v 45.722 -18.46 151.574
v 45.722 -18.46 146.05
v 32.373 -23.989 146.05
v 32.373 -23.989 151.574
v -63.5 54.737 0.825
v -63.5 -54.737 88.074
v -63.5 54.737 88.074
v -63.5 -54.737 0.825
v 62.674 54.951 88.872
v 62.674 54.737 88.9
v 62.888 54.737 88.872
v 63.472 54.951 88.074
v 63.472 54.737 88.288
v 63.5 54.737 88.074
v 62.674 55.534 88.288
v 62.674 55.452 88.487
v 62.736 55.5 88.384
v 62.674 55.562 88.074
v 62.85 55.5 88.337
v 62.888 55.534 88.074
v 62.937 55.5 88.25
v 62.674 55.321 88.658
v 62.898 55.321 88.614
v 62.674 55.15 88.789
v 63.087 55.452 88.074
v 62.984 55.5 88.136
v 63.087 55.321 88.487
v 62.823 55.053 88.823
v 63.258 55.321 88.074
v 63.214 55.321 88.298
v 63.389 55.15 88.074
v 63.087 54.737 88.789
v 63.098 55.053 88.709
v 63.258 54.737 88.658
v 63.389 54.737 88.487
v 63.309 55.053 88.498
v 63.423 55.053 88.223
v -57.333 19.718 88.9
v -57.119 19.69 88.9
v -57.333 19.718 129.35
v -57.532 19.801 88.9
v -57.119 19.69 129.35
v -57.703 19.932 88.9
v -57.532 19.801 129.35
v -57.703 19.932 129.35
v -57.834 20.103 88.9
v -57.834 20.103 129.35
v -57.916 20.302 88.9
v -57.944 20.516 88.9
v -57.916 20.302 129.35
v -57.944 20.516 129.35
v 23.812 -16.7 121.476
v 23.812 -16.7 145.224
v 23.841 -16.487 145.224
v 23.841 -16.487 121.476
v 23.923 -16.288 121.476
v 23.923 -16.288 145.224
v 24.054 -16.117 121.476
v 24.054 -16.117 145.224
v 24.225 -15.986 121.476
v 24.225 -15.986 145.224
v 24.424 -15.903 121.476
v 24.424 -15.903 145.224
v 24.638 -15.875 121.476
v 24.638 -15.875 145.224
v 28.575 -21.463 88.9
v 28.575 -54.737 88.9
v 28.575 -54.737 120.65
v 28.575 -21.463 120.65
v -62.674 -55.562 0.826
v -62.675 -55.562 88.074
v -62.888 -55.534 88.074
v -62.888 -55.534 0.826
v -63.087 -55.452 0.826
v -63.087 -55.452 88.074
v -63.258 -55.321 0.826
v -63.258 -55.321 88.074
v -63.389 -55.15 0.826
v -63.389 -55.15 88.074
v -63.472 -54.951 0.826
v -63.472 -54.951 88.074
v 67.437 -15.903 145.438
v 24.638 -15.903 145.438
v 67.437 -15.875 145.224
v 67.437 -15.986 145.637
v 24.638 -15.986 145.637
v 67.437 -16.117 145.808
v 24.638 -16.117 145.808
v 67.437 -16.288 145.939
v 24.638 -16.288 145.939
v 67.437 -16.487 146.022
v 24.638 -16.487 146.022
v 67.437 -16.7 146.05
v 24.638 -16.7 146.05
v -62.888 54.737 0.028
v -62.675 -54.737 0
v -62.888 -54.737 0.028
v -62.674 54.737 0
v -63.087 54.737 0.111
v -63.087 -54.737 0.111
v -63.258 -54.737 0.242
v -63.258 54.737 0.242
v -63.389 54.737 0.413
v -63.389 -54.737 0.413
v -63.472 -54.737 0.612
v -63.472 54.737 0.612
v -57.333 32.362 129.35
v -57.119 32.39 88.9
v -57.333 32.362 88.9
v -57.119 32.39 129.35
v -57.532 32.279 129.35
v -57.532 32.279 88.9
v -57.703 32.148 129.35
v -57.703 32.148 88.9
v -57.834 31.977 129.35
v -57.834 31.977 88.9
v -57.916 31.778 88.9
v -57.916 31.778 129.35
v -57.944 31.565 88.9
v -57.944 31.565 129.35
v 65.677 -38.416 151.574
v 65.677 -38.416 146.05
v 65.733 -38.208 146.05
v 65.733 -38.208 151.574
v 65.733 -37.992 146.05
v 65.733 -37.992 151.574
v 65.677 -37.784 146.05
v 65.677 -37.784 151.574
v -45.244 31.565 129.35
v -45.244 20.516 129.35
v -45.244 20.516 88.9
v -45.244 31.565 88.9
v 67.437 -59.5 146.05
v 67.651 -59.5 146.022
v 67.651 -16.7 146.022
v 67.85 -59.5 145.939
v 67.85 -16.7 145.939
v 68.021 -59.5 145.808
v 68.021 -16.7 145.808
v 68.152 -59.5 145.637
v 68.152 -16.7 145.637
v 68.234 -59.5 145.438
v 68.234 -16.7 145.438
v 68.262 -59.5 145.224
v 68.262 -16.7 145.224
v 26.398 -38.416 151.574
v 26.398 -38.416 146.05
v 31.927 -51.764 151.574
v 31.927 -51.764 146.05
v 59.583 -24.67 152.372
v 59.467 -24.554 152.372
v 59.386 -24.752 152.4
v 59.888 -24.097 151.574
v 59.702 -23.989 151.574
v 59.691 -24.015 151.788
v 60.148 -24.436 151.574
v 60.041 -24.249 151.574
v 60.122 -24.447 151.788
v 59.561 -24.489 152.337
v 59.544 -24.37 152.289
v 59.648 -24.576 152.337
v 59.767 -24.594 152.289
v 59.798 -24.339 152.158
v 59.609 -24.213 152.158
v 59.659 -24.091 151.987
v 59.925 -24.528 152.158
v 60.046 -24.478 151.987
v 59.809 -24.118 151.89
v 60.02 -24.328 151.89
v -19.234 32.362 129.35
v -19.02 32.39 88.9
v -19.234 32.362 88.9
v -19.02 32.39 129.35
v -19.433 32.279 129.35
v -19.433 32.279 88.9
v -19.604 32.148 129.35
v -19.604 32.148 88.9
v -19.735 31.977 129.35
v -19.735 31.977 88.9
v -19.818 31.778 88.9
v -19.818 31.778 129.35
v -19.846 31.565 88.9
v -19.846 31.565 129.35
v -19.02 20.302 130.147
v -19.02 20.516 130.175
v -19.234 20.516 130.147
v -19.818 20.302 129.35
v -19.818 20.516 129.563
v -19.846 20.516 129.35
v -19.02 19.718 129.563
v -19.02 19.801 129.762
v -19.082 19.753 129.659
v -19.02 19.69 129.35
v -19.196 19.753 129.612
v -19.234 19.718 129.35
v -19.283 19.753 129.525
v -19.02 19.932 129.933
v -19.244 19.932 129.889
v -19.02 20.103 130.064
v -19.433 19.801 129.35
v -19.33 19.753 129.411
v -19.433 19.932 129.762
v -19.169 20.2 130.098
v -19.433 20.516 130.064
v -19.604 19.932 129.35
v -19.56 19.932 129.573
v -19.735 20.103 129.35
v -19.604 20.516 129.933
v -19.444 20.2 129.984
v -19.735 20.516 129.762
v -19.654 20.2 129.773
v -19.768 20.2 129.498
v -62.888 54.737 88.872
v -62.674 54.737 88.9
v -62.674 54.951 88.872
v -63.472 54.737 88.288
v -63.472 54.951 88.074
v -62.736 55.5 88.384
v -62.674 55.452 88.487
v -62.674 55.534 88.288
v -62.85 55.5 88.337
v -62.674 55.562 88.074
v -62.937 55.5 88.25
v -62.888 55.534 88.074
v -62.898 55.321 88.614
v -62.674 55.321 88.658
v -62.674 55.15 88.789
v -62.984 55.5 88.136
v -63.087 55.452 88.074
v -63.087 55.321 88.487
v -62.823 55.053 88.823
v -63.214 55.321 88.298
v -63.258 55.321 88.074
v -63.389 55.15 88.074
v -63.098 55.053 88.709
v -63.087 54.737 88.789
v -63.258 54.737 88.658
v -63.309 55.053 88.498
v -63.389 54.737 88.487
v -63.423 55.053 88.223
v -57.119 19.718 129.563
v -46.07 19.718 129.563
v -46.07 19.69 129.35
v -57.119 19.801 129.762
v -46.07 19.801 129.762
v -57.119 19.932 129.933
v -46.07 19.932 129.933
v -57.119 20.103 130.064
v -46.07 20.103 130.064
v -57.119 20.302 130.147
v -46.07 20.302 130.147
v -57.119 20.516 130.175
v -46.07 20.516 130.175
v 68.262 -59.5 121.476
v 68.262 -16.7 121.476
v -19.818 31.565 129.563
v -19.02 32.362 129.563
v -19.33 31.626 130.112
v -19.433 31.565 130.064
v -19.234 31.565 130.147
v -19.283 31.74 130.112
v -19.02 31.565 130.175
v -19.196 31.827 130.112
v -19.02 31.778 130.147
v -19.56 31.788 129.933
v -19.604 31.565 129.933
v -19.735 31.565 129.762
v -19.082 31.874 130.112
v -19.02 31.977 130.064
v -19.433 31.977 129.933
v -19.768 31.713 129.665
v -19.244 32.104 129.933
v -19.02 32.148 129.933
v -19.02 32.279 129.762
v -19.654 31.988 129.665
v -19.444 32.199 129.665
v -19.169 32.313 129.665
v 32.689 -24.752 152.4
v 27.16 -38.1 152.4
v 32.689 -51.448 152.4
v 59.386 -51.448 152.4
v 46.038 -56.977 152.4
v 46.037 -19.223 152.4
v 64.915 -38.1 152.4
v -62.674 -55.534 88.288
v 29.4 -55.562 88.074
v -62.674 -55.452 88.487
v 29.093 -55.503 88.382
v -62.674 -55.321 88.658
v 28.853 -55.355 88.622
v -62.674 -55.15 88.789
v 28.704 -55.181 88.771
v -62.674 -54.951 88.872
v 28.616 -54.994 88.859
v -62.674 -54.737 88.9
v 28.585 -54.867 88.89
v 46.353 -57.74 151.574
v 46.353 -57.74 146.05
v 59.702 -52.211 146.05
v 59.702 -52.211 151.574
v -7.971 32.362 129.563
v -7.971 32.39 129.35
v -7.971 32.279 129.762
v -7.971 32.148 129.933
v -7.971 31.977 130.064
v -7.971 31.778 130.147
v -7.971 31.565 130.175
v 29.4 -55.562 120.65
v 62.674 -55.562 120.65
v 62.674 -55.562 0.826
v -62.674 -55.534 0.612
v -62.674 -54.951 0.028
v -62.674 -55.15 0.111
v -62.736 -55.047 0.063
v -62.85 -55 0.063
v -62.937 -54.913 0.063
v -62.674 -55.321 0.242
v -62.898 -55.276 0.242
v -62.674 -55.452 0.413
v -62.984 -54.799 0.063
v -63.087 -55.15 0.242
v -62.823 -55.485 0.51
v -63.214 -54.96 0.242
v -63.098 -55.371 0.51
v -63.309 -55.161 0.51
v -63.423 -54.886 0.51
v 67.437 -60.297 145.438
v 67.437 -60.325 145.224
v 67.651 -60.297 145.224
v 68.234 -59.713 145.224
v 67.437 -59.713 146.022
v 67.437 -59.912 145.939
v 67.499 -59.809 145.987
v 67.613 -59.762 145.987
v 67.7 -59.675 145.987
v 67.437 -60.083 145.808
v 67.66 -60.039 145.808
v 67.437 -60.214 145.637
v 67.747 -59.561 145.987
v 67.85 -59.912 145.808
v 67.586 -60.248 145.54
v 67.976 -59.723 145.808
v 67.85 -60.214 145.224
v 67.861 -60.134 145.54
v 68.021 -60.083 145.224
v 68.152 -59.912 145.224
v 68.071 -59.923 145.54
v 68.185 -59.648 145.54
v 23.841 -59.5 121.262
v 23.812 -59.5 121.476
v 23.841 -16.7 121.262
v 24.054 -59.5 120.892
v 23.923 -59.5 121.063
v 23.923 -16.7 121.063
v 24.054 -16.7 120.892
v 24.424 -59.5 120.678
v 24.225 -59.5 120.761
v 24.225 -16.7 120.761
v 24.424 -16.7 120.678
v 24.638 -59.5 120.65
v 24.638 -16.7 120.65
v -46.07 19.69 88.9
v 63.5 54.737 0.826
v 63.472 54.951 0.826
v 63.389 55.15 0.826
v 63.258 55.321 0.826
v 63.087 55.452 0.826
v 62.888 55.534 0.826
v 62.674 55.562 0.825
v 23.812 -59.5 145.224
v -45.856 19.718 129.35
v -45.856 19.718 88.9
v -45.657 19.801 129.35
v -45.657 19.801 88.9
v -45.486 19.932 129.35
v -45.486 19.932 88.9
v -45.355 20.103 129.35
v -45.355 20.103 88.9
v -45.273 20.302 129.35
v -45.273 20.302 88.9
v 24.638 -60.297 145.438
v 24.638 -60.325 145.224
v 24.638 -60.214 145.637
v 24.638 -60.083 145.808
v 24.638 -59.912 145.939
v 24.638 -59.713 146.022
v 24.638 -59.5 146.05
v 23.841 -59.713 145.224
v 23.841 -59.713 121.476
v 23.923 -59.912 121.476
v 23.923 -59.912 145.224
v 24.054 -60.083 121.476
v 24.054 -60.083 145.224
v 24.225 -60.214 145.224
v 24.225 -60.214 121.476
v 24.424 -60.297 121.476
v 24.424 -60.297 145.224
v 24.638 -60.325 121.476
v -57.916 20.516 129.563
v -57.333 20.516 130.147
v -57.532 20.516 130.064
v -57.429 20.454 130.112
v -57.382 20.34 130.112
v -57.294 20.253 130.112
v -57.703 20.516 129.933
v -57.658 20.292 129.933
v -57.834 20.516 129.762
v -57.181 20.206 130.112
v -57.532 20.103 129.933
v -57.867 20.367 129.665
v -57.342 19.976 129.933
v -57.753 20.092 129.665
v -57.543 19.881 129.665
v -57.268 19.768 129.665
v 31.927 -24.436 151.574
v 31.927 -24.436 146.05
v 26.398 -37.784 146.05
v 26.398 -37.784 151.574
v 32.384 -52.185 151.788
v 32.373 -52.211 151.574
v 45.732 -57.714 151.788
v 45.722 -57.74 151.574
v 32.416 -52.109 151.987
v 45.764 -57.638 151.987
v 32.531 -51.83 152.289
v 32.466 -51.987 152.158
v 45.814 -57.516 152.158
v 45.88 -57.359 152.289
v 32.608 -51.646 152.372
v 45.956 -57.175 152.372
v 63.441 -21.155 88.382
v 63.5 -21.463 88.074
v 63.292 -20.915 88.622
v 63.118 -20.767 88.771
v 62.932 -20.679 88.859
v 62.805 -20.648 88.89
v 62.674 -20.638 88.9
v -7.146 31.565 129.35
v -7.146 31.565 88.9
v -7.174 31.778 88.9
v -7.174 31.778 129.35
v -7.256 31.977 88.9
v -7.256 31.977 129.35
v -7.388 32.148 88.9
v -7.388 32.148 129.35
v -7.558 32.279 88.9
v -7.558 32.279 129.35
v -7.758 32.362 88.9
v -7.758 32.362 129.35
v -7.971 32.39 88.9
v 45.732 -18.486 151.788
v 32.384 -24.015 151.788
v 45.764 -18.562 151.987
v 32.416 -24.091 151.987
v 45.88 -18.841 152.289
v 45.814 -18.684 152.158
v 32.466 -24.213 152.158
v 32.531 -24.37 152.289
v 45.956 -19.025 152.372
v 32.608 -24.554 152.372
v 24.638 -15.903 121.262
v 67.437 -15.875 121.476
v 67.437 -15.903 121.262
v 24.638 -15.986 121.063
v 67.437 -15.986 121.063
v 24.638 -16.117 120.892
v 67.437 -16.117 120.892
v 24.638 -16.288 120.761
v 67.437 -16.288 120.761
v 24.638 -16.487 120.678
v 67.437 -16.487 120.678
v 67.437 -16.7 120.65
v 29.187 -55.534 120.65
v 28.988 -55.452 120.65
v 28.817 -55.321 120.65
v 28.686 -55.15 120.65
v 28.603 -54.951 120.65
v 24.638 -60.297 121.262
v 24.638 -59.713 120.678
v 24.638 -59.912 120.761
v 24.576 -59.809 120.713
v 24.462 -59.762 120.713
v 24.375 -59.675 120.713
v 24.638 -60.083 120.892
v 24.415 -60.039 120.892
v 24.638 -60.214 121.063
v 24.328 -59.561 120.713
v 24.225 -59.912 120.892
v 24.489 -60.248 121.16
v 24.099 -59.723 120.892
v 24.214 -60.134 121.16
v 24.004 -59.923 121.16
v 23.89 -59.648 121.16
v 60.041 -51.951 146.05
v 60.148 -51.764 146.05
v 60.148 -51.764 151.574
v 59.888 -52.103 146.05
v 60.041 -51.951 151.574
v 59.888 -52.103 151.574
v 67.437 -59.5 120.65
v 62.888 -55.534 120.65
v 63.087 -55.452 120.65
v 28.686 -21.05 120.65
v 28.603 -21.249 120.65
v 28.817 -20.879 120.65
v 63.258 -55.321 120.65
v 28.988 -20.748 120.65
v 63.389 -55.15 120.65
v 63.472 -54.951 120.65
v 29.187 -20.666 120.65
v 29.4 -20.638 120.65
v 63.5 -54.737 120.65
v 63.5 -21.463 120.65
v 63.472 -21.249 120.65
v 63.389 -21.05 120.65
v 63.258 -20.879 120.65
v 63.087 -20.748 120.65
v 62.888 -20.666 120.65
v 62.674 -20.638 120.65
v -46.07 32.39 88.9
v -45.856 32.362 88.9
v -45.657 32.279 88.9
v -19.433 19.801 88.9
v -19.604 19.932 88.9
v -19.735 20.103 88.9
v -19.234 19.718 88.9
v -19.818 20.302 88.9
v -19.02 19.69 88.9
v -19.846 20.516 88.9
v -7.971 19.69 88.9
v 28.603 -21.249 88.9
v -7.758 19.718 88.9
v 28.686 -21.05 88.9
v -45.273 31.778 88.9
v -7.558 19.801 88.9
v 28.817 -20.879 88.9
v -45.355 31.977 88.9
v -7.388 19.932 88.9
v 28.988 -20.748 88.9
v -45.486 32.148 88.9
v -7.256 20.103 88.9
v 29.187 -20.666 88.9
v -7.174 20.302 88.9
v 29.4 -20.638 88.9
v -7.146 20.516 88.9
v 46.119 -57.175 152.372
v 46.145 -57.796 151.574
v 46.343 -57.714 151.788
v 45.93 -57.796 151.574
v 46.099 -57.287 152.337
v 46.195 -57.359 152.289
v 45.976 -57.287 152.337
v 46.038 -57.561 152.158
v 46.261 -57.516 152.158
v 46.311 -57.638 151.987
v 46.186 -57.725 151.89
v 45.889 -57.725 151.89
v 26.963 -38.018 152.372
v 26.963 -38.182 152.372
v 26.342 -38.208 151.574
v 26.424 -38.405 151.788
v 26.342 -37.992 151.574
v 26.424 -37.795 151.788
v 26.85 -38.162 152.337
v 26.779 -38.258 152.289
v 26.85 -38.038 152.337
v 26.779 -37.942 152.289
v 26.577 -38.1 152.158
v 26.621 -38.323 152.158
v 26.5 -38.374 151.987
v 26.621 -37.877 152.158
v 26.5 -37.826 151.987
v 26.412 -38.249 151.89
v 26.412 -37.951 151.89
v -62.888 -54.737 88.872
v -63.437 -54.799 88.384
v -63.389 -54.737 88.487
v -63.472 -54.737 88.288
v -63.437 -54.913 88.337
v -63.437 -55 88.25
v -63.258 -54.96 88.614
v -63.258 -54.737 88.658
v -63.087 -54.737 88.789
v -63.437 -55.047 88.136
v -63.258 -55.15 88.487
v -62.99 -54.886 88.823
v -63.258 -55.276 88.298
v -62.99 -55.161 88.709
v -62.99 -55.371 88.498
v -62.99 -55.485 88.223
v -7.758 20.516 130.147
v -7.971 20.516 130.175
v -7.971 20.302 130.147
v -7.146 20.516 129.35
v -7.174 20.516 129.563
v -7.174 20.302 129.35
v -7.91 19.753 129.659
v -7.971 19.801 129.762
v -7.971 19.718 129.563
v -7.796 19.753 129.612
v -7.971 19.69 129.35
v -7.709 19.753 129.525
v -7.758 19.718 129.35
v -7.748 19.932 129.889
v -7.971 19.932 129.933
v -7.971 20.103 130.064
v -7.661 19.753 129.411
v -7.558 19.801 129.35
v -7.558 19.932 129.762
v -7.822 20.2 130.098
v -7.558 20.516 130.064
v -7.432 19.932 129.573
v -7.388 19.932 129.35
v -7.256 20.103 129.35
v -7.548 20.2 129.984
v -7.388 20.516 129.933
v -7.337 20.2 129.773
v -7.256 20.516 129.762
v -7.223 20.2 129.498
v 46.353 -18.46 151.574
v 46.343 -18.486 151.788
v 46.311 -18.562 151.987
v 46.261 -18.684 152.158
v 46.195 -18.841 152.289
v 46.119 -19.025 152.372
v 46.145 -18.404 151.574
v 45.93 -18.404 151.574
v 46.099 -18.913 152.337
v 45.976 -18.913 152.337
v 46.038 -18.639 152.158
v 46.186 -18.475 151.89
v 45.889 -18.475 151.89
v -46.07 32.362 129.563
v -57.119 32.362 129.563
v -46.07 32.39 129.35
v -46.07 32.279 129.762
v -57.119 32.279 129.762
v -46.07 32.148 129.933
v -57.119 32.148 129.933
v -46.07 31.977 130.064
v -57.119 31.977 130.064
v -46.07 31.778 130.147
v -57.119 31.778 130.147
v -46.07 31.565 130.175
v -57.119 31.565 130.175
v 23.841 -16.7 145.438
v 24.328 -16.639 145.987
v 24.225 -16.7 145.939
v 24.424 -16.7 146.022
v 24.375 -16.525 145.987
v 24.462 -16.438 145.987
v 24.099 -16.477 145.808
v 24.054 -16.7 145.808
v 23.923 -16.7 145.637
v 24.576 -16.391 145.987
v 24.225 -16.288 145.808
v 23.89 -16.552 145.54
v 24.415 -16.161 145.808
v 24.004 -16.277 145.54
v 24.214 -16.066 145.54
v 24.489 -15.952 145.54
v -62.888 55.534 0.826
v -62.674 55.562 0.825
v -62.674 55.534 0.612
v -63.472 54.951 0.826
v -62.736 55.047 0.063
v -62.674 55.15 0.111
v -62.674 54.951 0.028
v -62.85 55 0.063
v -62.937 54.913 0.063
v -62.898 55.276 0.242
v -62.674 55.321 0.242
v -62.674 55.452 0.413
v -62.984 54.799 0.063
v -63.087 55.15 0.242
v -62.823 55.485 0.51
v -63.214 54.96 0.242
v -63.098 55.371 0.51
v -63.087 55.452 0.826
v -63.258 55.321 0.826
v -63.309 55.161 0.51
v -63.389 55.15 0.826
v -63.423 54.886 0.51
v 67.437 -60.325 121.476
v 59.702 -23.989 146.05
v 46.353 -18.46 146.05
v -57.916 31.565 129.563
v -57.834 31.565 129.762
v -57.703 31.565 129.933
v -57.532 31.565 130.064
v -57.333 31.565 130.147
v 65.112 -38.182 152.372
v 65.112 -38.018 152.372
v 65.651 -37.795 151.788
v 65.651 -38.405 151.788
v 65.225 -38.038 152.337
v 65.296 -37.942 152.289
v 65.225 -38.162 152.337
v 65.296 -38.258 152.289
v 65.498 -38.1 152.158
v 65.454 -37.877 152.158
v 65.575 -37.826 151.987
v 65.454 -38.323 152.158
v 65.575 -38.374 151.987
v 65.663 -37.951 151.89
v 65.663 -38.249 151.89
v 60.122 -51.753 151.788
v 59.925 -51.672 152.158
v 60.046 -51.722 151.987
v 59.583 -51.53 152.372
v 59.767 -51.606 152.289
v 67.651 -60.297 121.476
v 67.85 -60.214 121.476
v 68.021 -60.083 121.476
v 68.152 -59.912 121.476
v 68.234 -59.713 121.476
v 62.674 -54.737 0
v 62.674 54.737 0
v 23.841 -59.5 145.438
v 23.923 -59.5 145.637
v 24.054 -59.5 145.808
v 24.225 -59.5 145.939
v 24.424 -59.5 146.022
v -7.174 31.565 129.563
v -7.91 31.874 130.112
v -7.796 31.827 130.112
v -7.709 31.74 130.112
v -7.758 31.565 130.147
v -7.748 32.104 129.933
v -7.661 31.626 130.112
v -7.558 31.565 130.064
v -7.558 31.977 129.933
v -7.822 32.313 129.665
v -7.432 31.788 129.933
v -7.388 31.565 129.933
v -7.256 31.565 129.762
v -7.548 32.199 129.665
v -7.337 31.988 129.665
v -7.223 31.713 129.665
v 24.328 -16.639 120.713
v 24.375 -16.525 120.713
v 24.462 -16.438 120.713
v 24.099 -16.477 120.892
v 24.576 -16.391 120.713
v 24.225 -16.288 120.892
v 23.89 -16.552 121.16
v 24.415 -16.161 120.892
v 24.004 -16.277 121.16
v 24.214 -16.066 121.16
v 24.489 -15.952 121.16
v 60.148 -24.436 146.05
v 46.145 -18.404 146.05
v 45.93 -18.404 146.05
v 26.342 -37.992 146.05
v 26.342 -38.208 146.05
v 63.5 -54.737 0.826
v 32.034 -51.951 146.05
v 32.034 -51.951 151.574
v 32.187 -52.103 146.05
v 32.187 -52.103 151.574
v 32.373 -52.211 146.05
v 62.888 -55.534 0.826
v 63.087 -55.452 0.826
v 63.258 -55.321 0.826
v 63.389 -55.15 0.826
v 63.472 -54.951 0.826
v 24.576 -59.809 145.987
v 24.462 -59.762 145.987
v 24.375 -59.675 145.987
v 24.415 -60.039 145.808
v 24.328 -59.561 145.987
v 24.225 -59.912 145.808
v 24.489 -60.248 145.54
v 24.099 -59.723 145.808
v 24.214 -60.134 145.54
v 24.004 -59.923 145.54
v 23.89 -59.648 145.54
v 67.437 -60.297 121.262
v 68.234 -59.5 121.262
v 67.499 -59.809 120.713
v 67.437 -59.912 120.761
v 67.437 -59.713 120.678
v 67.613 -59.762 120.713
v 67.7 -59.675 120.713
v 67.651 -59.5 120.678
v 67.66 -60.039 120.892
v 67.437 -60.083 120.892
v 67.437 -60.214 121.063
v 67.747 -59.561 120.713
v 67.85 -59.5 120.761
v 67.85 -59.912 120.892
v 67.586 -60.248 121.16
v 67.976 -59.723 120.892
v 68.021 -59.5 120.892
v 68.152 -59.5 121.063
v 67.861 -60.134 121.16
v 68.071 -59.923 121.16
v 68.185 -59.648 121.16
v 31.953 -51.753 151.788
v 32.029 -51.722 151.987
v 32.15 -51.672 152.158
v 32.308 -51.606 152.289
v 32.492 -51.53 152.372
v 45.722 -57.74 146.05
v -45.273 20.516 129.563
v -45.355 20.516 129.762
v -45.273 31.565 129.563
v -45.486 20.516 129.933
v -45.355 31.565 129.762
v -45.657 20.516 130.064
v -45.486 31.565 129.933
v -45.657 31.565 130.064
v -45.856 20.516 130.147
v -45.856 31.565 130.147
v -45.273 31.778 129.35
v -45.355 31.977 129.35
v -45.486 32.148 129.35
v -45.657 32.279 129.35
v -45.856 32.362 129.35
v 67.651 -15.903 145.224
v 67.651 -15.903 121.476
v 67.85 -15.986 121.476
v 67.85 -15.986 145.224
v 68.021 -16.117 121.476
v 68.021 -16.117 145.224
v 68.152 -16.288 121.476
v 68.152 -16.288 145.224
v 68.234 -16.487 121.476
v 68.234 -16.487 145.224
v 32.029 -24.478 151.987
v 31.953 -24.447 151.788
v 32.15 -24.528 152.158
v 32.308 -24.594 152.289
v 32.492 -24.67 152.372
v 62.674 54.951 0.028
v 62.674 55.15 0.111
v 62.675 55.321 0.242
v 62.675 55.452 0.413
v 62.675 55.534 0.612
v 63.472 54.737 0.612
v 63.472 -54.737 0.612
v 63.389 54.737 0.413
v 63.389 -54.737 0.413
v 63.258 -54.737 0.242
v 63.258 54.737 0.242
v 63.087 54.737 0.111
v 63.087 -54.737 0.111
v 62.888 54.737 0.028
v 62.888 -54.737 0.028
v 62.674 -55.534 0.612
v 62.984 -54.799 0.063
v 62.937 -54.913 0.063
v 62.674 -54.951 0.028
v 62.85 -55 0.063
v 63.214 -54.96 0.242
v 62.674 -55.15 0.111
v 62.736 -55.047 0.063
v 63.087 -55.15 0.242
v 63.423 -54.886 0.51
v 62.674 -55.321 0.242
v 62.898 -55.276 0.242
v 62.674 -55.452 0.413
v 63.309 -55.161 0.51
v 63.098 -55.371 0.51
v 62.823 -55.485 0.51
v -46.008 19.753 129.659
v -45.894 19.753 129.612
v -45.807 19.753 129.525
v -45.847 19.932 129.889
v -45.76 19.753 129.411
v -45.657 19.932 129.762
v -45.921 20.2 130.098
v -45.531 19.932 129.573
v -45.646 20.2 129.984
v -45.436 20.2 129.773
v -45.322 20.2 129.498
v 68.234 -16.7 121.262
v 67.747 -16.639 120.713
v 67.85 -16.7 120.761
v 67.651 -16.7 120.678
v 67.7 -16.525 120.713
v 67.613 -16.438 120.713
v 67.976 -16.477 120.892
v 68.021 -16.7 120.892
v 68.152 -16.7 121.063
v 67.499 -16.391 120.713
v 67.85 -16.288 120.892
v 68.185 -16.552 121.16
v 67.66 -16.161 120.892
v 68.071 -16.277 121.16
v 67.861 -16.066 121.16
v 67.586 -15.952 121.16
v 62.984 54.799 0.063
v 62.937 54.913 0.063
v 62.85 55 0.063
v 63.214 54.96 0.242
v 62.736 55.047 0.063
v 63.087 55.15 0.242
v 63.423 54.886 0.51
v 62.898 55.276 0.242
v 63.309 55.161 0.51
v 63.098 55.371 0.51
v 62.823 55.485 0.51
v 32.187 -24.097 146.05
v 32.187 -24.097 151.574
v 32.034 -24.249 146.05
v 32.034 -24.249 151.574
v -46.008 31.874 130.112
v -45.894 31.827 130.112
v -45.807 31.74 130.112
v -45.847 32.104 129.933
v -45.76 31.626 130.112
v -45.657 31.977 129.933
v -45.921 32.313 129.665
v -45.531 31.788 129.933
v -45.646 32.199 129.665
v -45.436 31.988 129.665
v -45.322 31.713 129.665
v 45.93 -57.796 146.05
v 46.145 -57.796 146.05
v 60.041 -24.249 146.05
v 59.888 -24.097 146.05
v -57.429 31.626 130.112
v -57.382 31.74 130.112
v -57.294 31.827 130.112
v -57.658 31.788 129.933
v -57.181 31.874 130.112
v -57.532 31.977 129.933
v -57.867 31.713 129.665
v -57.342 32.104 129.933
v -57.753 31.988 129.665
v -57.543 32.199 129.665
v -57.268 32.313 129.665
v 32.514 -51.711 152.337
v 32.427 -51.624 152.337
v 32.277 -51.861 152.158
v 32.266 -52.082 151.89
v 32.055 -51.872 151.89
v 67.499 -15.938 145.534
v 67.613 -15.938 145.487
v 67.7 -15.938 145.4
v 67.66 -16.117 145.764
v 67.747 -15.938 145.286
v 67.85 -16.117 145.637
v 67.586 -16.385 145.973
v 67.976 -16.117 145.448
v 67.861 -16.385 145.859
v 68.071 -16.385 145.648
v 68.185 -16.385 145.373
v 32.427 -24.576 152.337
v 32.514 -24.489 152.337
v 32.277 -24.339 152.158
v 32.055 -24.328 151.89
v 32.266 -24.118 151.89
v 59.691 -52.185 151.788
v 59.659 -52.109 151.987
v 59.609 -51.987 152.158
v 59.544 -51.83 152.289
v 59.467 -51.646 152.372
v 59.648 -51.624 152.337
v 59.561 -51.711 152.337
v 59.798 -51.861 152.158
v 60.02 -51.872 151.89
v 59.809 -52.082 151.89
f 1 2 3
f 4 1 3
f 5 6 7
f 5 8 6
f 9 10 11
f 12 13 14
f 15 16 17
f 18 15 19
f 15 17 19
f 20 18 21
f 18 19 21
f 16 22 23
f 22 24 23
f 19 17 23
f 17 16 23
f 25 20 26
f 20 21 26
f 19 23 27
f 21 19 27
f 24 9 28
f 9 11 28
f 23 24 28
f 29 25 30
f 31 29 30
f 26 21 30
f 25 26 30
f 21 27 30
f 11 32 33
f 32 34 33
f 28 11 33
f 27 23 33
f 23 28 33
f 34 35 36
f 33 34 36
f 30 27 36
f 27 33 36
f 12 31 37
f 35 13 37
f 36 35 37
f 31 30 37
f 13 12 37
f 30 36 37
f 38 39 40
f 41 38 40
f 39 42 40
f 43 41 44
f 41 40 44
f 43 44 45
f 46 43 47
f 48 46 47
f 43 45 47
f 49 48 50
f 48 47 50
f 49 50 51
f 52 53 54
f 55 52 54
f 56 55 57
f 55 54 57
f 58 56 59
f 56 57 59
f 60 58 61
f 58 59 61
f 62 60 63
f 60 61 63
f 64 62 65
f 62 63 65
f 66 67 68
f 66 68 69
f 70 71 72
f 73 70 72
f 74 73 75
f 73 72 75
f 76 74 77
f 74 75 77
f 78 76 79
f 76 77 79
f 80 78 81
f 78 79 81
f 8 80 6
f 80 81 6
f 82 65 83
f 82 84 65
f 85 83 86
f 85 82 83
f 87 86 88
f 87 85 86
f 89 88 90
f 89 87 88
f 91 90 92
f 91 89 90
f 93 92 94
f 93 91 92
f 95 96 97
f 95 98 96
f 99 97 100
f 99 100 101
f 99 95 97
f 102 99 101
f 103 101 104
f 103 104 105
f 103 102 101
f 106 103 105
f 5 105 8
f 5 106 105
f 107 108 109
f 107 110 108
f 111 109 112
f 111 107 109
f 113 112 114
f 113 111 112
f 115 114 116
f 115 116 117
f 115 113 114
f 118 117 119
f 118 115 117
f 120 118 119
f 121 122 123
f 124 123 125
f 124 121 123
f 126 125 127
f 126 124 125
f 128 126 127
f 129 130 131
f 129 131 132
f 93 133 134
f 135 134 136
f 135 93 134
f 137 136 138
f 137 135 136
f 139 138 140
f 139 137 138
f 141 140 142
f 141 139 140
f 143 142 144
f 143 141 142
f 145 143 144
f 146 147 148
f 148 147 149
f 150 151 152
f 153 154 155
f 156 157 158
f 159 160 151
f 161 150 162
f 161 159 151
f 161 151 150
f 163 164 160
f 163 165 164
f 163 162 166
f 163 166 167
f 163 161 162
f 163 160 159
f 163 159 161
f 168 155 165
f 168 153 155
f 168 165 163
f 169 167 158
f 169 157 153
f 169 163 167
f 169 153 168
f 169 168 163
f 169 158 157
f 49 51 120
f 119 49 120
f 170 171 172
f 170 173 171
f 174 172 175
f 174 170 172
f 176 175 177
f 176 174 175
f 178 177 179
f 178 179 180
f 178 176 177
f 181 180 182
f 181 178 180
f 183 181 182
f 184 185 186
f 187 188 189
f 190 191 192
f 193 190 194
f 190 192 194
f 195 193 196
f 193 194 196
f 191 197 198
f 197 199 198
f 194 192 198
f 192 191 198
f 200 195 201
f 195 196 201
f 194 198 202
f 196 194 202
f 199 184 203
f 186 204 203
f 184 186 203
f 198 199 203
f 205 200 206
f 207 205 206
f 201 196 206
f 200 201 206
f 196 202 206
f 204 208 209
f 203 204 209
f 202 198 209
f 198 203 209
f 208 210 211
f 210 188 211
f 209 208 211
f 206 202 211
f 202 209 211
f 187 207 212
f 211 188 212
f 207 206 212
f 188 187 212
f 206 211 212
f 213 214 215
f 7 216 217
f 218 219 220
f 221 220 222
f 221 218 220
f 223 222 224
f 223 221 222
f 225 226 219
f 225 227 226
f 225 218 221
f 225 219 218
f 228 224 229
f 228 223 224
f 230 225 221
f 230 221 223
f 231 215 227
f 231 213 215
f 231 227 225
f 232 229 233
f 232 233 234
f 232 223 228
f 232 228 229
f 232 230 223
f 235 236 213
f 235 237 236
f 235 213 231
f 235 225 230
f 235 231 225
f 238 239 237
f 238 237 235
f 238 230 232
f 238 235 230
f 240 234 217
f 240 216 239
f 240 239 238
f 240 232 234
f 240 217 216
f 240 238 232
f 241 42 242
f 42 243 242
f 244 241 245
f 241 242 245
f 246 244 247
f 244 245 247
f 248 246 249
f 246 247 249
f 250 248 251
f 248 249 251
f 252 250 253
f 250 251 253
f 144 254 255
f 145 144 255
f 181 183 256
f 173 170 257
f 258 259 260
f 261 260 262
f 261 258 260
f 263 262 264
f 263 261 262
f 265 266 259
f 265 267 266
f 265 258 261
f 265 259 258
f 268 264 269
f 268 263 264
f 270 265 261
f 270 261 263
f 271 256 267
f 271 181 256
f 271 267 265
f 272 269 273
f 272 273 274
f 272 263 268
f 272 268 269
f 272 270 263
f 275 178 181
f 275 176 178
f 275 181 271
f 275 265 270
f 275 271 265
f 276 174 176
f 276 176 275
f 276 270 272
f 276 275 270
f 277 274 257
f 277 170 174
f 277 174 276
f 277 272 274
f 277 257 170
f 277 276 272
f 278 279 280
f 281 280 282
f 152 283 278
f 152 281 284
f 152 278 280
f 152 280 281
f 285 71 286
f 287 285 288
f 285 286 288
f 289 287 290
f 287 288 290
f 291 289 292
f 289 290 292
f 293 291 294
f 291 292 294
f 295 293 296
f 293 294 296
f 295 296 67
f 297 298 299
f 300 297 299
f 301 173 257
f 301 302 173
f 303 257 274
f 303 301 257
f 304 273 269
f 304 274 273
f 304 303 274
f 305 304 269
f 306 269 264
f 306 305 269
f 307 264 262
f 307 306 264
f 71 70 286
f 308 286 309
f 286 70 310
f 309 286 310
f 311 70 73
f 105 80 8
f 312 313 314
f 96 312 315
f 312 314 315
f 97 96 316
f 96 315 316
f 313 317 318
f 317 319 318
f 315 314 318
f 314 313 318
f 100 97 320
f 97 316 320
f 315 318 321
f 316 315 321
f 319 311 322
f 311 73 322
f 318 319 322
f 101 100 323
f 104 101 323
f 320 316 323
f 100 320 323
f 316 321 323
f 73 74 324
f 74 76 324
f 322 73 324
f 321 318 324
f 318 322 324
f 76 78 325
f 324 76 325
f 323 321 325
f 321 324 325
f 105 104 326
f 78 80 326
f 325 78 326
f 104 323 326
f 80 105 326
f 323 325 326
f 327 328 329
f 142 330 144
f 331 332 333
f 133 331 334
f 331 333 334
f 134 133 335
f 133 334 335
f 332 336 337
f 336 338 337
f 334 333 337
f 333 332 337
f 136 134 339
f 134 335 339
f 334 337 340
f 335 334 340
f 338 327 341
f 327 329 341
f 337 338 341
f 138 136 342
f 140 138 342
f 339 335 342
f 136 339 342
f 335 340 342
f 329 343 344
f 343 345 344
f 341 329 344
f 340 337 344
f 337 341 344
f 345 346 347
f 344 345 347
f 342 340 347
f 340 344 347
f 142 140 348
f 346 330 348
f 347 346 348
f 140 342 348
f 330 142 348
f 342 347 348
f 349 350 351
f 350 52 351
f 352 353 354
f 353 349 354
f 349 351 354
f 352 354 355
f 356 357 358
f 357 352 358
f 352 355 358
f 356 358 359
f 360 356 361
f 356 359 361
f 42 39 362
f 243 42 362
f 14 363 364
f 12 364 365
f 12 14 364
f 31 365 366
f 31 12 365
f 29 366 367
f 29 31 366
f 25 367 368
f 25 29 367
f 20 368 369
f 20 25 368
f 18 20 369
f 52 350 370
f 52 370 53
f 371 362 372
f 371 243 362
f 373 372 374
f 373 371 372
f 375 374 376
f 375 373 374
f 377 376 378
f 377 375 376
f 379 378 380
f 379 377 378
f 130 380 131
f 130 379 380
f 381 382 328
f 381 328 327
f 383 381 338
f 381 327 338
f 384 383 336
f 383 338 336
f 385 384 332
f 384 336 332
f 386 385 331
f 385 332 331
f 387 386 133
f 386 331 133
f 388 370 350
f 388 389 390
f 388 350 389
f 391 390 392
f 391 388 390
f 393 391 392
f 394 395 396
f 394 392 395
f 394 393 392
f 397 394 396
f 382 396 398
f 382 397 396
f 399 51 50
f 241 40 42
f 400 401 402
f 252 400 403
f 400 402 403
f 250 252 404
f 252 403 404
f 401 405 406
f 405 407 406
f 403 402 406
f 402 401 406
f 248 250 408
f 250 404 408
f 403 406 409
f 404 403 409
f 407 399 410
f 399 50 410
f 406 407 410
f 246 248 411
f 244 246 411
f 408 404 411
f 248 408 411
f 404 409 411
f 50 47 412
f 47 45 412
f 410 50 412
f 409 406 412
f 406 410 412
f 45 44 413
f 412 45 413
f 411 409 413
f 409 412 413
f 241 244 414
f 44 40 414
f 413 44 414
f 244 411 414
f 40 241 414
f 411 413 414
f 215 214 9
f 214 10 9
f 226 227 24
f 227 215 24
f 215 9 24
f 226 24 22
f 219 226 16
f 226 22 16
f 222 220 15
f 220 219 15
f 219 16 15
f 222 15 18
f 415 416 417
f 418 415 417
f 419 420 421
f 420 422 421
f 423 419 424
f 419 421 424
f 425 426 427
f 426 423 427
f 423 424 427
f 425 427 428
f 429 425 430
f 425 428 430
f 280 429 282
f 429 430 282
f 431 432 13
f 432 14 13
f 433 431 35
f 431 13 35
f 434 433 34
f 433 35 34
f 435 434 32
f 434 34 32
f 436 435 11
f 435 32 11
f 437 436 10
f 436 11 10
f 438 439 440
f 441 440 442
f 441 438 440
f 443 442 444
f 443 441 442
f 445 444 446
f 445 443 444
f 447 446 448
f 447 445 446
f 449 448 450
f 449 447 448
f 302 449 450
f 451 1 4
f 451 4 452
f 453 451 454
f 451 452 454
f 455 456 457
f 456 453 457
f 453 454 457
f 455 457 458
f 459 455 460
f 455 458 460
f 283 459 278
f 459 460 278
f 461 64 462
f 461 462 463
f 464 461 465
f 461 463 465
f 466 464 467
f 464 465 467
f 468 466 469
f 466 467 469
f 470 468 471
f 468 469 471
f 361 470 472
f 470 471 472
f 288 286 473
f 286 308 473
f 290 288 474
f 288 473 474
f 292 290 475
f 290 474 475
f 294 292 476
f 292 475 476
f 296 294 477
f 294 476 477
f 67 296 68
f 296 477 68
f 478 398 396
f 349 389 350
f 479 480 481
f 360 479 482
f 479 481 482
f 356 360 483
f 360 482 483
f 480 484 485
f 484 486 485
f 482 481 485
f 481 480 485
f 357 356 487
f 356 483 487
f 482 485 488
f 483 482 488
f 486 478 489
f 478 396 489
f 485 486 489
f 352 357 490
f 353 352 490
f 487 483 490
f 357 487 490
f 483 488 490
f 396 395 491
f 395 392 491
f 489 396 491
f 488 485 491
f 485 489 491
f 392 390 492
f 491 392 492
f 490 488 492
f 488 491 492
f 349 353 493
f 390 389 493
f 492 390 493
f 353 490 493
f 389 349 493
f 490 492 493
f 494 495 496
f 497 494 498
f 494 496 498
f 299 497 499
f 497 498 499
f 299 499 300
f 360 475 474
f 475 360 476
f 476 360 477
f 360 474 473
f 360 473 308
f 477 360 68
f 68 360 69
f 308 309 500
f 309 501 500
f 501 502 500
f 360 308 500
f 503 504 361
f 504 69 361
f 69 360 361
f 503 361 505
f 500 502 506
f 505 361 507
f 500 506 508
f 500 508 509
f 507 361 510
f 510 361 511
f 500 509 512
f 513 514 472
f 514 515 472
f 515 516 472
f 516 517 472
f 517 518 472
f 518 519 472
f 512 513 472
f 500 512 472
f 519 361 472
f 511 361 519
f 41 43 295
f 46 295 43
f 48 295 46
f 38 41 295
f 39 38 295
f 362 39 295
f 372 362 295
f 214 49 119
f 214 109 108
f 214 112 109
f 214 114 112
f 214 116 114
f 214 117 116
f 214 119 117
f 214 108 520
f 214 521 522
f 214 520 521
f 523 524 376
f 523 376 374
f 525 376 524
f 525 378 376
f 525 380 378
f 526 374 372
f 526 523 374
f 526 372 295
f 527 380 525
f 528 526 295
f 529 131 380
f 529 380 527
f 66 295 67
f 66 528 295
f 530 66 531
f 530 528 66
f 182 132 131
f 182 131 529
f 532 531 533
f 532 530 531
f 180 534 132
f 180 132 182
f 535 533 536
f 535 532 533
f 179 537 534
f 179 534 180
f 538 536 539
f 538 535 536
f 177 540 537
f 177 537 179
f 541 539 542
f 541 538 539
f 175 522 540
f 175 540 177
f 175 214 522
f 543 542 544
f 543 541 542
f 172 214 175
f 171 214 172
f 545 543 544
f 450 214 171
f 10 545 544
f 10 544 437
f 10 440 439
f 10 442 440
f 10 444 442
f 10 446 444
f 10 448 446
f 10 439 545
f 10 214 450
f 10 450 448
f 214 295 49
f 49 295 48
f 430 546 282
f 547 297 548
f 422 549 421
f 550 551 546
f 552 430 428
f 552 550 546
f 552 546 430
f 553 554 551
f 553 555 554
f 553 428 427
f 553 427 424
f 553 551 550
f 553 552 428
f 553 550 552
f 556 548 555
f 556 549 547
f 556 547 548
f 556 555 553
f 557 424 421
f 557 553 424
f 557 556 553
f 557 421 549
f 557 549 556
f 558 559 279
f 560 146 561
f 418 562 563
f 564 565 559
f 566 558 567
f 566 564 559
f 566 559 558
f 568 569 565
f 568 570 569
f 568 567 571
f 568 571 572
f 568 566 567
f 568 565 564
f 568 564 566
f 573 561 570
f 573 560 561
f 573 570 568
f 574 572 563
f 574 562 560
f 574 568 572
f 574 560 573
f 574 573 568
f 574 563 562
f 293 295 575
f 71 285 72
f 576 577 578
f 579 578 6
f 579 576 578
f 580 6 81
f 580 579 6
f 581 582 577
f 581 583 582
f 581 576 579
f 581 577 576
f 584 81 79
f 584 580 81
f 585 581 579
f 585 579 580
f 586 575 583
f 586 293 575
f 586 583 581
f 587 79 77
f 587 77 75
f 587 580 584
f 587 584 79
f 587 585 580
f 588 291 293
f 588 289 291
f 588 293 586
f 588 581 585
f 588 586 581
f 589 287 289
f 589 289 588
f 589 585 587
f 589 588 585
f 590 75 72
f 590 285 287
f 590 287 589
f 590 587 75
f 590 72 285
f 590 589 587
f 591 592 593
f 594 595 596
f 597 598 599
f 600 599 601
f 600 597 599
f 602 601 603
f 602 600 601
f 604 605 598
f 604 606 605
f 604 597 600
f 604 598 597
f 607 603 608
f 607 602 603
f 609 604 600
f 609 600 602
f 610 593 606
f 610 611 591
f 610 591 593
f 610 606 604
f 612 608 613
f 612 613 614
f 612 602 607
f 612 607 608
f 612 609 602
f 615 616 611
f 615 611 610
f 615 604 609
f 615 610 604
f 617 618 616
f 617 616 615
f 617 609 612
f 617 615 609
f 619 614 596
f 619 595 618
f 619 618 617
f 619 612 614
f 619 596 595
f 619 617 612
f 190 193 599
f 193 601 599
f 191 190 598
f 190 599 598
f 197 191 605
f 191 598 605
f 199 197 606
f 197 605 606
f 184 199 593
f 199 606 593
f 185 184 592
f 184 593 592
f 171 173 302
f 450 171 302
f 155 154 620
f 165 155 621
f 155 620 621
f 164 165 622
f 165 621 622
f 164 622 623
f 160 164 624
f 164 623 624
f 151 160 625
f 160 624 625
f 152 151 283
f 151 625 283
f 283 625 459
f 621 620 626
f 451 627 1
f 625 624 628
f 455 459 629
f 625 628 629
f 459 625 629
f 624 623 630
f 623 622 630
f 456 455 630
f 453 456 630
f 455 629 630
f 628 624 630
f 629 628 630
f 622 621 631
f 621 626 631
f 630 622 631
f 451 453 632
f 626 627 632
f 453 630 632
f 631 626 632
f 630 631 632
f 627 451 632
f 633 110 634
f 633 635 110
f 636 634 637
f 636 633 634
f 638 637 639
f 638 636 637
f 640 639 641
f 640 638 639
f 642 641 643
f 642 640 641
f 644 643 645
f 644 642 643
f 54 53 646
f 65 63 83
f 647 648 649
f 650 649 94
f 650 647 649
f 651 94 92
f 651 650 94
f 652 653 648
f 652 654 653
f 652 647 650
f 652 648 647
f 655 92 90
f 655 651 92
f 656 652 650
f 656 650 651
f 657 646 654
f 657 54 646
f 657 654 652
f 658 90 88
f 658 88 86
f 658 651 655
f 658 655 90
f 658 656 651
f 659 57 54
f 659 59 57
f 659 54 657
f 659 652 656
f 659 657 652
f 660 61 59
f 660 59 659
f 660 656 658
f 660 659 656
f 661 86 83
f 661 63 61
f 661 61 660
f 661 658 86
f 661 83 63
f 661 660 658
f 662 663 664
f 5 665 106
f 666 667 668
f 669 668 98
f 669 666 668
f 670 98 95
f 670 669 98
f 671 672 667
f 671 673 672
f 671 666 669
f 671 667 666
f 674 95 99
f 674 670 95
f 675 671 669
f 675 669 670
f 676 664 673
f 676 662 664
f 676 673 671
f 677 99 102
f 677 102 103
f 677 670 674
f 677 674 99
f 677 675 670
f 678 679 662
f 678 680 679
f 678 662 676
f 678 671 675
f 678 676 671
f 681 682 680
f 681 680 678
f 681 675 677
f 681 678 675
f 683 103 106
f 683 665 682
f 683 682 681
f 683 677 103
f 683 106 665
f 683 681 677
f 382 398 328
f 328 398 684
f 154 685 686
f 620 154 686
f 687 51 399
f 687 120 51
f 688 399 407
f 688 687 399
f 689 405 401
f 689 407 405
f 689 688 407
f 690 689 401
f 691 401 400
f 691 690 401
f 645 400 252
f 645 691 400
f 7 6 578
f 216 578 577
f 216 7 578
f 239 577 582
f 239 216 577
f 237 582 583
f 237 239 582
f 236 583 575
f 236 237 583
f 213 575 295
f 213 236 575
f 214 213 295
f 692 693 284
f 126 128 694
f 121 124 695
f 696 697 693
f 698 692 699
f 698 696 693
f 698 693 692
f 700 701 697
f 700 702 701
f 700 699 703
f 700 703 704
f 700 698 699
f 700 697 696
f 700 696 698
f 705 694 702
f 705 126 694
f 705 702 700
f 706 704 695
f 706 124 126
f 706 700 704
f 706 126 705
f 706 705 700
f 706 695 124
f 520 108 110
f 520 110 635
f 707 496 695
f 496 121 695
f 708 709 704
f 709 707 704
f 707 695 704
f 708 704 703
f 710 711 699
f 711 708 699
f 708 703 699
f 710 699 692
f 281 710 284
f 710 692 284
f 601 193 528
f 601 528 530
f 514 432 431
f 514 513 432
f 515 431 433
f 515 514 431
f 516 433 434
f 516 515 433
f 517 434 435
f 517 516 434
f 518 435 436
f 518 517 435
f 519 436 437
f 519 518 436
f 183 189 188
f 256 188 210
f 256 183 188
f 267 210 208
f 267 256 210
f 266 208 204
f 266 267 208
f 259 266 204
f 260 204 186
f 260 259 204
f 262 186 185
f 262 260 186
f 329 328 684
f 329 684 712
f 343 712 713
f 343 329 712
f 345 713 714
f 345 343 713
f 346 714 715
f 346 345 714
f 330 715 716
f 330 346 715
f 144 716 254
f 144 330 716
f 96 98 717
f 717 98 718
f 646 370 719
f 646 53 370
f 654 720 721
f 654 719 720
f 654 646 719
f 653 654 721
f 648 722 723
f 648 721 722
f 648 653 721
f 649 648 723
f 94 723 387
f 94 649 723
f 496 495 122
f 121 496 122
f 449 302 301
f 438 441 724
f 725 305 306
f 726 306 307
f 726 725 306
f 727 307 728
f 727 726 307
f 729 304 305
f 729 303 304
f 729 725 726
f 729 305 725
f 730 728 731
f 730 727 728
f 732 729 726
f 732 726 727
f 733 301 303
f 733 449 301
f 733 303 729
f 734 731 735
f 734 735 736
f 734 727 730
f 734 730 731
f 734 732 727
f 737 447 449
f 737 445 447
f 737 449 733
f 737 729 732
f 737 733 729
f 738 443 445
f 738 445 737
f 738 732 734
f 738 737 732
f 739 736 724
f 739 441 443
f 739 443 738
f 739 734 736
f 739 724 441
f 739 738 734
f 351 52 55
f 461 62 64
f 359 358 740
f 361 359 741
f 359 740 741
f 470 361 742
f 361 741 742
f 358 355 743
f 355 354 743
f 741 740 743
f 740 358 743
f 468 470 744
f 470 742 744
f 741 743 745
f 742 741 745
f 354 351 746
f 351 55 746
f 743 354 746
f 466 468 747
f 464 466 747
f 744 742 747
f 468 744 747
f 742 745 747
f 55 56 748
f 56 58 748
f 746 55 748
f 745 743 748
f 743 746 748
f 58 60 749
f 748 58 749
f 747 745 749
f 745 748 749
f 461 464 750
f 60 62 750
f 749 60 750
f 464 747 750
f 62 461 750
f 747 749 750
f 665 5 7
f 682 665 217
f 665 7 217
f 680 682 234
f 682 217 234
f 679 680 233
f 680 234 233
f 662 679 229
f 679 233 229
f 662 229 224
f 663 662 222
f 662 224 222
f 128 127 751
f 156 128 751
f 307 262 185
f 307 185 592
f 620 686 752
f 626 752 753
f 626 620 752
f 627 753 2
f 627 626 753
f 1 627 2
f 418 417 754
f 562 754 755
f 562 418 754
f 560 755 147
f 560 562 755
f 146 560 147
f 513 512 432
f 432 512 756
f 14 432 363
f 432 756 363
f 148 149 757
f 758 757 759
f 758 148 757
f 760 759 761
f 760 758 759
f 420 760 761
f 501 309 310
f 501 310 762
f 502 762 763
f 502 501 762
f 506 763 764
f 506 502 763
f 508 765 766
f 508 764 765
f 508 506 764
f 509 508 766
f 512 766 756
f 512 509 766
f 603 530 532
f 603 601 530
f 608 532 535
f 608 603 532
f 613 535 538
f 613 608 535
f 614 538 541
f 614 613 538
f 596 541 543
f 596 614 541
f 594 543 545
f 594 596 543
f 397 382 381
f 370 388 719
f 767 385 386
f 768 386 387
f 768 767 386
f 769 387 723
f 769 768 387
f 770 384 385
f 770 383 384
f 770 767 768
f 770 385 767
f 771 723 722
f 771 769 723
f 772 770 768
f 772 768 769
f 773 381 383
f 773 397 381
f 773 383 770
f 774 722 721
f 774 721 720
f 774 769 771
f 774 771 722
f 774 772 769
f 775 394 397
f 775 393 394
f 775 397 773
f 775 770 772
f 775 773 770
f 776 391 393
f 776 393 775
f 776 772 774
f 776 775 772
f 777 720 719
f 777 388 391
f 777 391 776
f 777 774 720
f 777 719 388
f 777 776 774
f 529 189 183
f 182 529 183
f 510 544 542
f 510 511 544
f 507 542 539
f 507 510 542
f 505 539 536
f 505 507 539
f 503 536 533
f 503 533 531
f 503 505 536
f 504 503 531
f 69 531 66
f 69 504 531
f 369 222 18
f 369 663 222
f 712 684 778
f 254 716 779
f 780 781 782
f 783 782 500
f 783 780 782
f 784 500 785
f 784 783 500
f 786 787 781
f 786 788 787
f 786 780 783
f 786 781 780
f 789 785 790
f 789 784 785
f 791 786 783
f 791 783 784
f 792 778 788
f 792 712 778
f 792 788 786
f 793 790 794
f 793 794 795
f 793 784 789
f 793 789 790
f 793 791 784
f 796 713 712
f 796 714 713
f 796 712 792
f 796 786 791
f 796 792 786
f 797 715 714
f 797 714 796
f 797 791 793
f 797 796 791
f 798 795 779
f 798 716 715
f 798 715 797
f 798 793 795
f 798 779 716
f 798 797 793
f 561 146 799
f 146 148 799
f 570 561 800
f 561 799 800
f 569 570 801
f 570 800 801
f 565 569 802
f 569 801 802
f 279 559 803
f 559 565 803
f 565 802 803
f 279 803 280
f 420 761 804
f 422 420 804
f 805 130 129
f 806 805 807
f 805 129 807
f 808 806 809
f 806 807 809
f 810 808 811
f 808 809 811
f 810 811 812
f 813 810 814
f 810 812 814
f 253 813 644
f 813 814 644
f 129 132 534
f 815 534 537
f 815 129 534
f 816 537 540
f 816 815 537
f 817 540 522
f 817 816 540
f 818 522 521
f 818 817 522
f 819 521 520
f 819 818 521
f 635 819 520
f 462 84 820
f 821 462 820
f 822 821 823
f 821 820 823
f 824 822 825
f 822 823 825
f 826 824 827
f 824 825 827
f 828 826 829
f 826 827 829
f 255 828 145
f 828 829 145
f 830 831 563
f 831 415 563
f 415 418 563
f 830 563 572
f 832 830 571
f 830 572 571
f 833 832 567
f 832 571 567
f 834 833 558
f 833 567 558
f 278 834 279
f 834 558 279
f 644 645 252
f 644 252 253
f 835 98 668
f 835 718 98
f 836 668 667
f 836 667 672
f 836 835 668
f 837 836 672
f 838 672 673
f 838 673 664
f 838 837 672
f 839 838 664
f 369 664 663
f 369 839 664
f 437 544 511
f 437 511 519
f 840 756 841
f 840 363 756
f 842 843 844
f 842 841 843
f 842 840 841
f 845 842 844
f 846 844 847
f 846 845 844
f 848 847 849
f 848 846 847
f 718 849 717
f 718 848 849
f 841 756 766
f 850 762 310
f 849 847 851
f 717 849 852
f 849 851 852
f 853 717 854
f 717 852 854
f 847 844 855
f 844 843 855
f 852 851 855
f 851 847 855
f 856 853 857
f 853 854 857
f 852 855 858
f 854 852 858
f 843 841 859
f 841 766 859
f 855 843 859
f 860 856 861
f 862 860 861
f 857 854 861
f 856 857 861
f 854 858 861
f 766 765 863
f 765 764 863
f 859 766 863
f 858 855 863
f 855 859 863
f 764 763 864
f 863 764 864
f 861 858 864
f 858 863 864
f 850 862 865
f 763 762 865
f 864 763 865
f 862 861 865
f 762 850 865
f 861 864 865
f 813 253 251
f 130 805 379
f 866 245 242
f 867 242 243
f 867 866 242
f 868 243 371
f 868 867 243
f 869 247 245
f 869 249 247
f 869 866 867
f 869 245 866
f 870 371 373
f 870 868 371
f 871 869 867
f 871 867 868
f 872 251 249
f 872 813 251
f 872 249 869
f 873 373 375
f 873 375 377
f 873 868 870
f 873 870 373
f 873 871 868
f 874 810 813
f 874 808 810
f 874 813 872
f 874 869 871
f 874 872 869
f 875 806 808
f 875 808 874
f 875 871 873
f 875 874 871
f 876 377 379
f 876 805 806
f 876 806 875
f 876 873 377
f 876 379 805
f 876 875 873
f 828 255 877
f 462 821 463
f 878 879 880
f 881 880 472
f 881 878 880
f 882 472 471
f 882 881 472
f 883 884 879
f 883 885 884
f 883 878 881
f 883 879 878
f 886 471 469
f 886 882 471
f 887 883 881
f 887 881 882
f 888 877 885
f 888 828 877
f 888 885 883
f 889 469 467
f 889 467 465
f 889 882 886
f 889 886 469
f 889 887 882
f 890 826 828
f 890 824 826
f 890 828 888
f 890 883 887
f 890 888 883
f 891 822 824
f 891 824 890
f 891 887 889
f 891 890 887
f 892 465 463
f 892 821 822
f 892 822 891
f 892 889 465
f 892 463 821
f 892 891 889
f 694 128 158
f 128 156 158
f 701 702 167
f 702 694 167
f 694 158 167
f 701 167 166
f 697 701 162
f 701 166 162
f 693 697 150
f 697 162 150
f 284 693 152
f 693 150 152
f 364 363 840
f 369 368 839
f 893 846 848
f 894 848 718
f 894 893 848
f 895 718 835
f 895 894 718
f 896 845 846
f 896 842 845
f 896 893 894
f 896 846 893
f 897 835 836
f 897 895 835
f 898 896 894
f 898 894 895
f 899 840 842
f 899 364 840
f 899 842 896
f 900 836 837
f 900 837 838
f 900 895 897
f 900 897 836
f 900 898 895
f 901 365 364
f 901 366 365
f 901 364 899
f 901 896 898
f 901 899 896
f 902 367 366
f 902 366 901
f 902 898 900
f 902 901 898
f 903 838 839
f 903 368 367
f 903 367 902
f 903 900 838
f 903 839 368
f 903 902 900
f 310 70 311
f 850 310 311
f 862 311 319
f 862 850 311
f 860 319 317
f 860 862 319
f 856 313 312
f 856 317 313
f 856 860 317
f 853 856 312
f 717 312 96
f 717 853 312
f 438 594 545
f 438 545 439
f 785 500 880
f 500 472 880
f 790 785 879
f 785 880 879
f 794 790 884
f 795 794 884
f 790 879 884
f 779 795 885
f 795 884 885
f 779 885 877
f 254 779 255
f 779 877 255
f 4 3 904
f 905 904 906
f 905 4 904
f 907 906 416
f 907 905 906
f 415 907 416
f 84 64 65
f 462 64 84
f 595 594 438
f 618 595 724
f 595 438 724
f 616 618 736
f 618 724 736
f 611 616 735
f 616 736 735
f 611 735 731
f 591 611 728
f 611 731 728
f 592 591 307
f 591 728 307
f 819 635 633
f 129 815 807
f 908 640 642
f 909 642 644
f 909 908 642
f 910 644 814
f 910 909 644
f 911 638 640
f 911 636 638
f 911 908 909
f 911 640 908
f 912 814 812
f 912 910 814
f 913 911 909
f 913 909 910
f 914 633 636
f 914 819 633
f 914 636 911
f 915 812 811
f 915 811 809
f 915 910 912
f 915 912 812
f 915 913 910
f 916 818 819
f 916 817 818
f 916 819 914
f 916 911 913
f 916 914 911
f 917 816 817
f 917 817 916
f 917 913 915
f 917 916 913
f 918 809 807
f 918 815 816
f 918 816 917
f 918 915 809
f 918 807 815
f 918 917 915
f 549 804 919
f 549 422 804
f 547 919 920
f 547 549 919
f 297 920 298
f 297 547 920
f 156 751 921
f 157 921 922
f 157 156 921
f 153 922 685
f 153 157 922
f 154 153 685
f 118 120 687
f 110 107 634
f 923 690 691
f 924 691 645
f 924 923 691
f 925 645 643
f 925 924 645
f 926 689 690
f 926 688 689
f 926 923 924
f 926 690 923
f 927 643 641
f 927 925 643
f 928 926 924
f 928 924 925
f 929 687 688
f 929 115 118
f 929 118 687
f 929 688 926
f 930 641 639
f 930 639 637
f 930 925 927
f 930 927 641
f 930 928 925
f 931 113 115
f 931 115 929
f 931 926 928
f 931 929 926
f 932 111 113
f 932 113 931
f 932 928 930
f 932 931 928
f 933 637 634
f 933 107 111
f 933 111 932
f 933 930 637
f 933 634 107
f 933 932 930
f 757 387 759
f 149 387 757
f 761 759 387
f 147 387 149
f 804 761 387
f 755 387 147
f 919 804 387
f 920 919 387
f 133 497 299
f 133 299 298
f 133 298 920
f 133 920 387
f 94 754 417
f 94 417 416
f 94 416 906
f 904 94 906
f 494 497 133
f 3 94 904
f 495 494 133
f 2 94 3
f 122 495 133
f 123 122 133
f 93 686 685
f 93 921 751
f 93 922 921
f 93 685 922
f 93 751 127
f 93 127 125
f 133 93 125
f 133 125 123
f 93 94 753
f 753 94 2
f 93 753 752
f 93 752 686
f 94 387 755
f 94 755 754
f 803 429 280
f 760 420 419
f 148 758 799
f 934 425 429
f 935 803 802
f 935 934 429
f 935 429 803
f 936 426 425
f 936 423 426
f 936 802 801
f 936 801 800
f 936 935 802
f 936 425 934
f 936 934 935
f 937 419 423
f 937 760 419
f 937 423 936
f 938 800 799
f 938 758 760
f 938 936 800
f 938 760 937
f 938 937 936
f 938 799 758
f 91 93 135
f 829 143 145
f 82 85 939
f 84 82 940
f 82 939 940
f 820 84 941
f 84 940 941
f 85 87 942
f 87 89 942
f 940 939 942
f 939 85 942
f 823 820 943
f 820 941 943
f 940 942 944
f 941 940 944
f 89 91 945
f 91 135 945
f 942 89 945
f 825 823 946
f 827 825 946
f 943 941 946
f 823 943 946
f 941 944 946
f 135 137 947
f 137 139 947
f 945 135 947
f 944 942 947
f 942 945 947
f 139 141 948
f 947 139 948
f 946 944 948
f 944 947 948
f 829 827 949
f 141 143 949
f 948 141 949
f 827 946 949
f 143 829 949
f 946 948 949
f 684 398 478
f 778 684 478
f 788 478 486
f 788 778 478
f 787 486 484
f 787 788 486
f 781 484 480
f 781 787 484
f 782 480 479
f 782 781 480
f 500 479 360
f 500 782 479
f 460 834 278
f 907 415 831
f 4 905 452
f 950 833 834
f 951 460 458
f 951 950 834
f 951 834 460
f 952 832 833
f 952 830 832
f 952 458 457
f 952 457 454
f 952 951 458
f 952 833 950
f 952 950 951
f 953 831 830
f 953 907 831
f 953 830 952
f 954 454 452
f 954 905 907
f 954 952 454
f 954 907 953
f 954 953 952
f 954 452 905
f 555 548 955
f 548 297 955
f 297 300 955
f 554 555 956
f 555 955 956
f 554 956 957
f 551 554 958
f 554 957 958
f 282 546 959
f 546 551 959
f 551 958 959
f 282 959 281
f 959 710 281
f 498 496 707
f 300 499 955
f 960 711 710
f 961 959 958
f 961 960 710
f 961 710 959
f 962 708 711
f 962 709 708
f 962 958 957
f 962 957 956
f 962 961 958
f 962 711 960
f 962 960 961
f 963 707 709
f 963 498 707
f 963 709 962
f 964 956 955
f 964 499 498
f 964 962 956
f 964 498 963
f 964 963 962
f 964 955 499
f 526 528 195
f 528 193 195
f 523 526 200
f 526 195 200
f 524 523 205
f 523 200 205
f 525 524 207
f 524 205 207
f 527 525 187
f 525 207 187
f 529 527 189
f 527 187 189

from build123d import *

# Parameters (mm, degrees)
F0_W     = 127
F0_H     = 111.125
F1_DEPTH = 88.9
F2_W     = 34.925
F2_H     = 34.925
F3_DEPTH = 31.75
F4_W     = 44.45
F4_H     = 44.45
F5_DEPTH = 25.4
F7_DEPTH = 6.35
F8_W     = 12.7
F8_H     = 12.7
F9_DEPTH = 41.275
F10_R    = 0.8255


with BuildPart() as f1:
    # F0 (on Top) → F1 (new body)
    with BuildSketch(Plane.XY):
        Rectangle(F0_W, F0_H)
    extrude(amount=F1_DEPTH)

    # F2 (on face) → F3 (join)
    with BuildSketch(Plane.XY.offset(88.9)):
        with Locations((46.0375, -38.1)):
            Rectangle(F2_W, F2_H)
    extrude(amount=F3_DEPTH)

    # F4 (on face) → F5 (join)
    with BuildSketch(Plane.XY.offset(120.65)):
        with Locations((46.0375, -38.1)):
            Rectangle(F4_W, F4_H)
    extrude(amount=F5_DEPTH)

    # F6 (on face) → F7 (join)
    with BuildSketch(Plane.XY.offset(146.05)):
        Polygon((60.0175166498, -52.0800166498), (65.8082291484, -38.1), (60.0175166498, -24.1199833502), (46.0375, -18.3292708516), (32.0574833502, -24.1199833502), (26.2667708516, -38.1), (32.0574833502, -52.0800166498), (46.0375, -57.8707291484), align=None)
    extrude(amount=F7_DEPTH)

    # F8 (on face) → F9 (join)
    with BuildSketch(Plane.XY.offset(88.9)):
        with Locations((-51.5943879418, 26.04008)):
            Rectangle(F8_W, F8_H)
        with Locations((-13.4957394752, 26.04008)):
            Rectangle(F8_W, F8_H)
    extrude(amount=F9_DEPTH)

    # F10
    f10_edges = [f1.edges().sort_by_distance(p)[0] for p in [
        (-17.4625, -55.5625, 88.9),
        (-63.5, 0, 88.9),
        (-63.5, -55.5625, 44.45),
        (28.575, -55.5625, 104.775),
        (63.5, -55.5625, 60.325),
        (28.575, -20.6375, 104.775),
        (23.8125, -15.875, 133.35),
        (23.8125, -60.325, 133.35),
        (68.2625, -60.325, 133.35),
        (46.0375, -60.325, 120.65),
        (23.8125, -38.1, 120.65),
        (46.0375, -60.325, 146.05),
        (23.8125, -38.1, 146.05),
        (68.2625, -38.1, 146.05),
        (46.0375, -15.875, 146.05),
        (53.027508, -21.224627, 152.4),
        (62.912873, -31.109992, 152.4),
        (62.912873, -45.090008, 152.4),
        (53.027508, -54.975373, 152.4),
        (39.047492, -54.975373, 152.4),
        (29.162127, -45.090008, 152.4),
        (29.162127, -31.109992, 152.4),
        (39.047492, -21.224627, 152.4),
        (32.057483, -52.080017, 149.225),
        (46.0375, -57.870729, 149.225),
        (26.266771, -38.1, 149.225),
        (60.017517, -52.080017, 149.225),
        (65.808229, -38.1, 149.225),
        (60.017517, -24.119983, 149.225),
        (46.0375, -18.329271, 149.225),
        (32.057483, -24.119983, 149.225),
        (68.2625, -15.875, 133.35),
        (63.5, -20.6375, 104.775),
        (68.2625, -38.1, 120.65),
        (46.0375, -15.875, 120.65),
        (63.5, 17.4625, 88.9),
        (0, 55.5625, 88.9),
        (63.5, 55.5625, 44.45),
        (-57.944388, 32.39008, 109.5375),
        (-45.244388, 32.39008, 109.5375),
        (-57.944388, 19.69008, 109.5375),
        (-57.944388, 26.04008, 130.175),
        (-51.594388, 32.39008, 130.175),
        (-45.244388, 26.04008, 130.175),
        (-51.594388, 19.69008, 130.175),
        (-19.845739, 32.39008, 109.5375),
        (-7.145739, 32.39008, 109.5375),
        (-19.845739, 26.04008, 130.175),
        (-13.495739, 32.39008, 130.175),
        (-7.145739, 26.04008, 130.175),
        (-13.495739, 19.69008, 130.175),
        (-19.845739, 19.69008, 109.5375),
        (-7.145739, 19.69008, 109.5375),
        (-45.244388, 19.69008, 109.5375),
        (-63.5, 55.5625, 44.45),
        (63.5, 0, 0),
        (0, 55.5625, 0),
        (0, -55.5625, 0),
        (-63.5, 0, 0),
    ]]
    fillet(f10_edges, radius=F10_R)


solid = f1.part
